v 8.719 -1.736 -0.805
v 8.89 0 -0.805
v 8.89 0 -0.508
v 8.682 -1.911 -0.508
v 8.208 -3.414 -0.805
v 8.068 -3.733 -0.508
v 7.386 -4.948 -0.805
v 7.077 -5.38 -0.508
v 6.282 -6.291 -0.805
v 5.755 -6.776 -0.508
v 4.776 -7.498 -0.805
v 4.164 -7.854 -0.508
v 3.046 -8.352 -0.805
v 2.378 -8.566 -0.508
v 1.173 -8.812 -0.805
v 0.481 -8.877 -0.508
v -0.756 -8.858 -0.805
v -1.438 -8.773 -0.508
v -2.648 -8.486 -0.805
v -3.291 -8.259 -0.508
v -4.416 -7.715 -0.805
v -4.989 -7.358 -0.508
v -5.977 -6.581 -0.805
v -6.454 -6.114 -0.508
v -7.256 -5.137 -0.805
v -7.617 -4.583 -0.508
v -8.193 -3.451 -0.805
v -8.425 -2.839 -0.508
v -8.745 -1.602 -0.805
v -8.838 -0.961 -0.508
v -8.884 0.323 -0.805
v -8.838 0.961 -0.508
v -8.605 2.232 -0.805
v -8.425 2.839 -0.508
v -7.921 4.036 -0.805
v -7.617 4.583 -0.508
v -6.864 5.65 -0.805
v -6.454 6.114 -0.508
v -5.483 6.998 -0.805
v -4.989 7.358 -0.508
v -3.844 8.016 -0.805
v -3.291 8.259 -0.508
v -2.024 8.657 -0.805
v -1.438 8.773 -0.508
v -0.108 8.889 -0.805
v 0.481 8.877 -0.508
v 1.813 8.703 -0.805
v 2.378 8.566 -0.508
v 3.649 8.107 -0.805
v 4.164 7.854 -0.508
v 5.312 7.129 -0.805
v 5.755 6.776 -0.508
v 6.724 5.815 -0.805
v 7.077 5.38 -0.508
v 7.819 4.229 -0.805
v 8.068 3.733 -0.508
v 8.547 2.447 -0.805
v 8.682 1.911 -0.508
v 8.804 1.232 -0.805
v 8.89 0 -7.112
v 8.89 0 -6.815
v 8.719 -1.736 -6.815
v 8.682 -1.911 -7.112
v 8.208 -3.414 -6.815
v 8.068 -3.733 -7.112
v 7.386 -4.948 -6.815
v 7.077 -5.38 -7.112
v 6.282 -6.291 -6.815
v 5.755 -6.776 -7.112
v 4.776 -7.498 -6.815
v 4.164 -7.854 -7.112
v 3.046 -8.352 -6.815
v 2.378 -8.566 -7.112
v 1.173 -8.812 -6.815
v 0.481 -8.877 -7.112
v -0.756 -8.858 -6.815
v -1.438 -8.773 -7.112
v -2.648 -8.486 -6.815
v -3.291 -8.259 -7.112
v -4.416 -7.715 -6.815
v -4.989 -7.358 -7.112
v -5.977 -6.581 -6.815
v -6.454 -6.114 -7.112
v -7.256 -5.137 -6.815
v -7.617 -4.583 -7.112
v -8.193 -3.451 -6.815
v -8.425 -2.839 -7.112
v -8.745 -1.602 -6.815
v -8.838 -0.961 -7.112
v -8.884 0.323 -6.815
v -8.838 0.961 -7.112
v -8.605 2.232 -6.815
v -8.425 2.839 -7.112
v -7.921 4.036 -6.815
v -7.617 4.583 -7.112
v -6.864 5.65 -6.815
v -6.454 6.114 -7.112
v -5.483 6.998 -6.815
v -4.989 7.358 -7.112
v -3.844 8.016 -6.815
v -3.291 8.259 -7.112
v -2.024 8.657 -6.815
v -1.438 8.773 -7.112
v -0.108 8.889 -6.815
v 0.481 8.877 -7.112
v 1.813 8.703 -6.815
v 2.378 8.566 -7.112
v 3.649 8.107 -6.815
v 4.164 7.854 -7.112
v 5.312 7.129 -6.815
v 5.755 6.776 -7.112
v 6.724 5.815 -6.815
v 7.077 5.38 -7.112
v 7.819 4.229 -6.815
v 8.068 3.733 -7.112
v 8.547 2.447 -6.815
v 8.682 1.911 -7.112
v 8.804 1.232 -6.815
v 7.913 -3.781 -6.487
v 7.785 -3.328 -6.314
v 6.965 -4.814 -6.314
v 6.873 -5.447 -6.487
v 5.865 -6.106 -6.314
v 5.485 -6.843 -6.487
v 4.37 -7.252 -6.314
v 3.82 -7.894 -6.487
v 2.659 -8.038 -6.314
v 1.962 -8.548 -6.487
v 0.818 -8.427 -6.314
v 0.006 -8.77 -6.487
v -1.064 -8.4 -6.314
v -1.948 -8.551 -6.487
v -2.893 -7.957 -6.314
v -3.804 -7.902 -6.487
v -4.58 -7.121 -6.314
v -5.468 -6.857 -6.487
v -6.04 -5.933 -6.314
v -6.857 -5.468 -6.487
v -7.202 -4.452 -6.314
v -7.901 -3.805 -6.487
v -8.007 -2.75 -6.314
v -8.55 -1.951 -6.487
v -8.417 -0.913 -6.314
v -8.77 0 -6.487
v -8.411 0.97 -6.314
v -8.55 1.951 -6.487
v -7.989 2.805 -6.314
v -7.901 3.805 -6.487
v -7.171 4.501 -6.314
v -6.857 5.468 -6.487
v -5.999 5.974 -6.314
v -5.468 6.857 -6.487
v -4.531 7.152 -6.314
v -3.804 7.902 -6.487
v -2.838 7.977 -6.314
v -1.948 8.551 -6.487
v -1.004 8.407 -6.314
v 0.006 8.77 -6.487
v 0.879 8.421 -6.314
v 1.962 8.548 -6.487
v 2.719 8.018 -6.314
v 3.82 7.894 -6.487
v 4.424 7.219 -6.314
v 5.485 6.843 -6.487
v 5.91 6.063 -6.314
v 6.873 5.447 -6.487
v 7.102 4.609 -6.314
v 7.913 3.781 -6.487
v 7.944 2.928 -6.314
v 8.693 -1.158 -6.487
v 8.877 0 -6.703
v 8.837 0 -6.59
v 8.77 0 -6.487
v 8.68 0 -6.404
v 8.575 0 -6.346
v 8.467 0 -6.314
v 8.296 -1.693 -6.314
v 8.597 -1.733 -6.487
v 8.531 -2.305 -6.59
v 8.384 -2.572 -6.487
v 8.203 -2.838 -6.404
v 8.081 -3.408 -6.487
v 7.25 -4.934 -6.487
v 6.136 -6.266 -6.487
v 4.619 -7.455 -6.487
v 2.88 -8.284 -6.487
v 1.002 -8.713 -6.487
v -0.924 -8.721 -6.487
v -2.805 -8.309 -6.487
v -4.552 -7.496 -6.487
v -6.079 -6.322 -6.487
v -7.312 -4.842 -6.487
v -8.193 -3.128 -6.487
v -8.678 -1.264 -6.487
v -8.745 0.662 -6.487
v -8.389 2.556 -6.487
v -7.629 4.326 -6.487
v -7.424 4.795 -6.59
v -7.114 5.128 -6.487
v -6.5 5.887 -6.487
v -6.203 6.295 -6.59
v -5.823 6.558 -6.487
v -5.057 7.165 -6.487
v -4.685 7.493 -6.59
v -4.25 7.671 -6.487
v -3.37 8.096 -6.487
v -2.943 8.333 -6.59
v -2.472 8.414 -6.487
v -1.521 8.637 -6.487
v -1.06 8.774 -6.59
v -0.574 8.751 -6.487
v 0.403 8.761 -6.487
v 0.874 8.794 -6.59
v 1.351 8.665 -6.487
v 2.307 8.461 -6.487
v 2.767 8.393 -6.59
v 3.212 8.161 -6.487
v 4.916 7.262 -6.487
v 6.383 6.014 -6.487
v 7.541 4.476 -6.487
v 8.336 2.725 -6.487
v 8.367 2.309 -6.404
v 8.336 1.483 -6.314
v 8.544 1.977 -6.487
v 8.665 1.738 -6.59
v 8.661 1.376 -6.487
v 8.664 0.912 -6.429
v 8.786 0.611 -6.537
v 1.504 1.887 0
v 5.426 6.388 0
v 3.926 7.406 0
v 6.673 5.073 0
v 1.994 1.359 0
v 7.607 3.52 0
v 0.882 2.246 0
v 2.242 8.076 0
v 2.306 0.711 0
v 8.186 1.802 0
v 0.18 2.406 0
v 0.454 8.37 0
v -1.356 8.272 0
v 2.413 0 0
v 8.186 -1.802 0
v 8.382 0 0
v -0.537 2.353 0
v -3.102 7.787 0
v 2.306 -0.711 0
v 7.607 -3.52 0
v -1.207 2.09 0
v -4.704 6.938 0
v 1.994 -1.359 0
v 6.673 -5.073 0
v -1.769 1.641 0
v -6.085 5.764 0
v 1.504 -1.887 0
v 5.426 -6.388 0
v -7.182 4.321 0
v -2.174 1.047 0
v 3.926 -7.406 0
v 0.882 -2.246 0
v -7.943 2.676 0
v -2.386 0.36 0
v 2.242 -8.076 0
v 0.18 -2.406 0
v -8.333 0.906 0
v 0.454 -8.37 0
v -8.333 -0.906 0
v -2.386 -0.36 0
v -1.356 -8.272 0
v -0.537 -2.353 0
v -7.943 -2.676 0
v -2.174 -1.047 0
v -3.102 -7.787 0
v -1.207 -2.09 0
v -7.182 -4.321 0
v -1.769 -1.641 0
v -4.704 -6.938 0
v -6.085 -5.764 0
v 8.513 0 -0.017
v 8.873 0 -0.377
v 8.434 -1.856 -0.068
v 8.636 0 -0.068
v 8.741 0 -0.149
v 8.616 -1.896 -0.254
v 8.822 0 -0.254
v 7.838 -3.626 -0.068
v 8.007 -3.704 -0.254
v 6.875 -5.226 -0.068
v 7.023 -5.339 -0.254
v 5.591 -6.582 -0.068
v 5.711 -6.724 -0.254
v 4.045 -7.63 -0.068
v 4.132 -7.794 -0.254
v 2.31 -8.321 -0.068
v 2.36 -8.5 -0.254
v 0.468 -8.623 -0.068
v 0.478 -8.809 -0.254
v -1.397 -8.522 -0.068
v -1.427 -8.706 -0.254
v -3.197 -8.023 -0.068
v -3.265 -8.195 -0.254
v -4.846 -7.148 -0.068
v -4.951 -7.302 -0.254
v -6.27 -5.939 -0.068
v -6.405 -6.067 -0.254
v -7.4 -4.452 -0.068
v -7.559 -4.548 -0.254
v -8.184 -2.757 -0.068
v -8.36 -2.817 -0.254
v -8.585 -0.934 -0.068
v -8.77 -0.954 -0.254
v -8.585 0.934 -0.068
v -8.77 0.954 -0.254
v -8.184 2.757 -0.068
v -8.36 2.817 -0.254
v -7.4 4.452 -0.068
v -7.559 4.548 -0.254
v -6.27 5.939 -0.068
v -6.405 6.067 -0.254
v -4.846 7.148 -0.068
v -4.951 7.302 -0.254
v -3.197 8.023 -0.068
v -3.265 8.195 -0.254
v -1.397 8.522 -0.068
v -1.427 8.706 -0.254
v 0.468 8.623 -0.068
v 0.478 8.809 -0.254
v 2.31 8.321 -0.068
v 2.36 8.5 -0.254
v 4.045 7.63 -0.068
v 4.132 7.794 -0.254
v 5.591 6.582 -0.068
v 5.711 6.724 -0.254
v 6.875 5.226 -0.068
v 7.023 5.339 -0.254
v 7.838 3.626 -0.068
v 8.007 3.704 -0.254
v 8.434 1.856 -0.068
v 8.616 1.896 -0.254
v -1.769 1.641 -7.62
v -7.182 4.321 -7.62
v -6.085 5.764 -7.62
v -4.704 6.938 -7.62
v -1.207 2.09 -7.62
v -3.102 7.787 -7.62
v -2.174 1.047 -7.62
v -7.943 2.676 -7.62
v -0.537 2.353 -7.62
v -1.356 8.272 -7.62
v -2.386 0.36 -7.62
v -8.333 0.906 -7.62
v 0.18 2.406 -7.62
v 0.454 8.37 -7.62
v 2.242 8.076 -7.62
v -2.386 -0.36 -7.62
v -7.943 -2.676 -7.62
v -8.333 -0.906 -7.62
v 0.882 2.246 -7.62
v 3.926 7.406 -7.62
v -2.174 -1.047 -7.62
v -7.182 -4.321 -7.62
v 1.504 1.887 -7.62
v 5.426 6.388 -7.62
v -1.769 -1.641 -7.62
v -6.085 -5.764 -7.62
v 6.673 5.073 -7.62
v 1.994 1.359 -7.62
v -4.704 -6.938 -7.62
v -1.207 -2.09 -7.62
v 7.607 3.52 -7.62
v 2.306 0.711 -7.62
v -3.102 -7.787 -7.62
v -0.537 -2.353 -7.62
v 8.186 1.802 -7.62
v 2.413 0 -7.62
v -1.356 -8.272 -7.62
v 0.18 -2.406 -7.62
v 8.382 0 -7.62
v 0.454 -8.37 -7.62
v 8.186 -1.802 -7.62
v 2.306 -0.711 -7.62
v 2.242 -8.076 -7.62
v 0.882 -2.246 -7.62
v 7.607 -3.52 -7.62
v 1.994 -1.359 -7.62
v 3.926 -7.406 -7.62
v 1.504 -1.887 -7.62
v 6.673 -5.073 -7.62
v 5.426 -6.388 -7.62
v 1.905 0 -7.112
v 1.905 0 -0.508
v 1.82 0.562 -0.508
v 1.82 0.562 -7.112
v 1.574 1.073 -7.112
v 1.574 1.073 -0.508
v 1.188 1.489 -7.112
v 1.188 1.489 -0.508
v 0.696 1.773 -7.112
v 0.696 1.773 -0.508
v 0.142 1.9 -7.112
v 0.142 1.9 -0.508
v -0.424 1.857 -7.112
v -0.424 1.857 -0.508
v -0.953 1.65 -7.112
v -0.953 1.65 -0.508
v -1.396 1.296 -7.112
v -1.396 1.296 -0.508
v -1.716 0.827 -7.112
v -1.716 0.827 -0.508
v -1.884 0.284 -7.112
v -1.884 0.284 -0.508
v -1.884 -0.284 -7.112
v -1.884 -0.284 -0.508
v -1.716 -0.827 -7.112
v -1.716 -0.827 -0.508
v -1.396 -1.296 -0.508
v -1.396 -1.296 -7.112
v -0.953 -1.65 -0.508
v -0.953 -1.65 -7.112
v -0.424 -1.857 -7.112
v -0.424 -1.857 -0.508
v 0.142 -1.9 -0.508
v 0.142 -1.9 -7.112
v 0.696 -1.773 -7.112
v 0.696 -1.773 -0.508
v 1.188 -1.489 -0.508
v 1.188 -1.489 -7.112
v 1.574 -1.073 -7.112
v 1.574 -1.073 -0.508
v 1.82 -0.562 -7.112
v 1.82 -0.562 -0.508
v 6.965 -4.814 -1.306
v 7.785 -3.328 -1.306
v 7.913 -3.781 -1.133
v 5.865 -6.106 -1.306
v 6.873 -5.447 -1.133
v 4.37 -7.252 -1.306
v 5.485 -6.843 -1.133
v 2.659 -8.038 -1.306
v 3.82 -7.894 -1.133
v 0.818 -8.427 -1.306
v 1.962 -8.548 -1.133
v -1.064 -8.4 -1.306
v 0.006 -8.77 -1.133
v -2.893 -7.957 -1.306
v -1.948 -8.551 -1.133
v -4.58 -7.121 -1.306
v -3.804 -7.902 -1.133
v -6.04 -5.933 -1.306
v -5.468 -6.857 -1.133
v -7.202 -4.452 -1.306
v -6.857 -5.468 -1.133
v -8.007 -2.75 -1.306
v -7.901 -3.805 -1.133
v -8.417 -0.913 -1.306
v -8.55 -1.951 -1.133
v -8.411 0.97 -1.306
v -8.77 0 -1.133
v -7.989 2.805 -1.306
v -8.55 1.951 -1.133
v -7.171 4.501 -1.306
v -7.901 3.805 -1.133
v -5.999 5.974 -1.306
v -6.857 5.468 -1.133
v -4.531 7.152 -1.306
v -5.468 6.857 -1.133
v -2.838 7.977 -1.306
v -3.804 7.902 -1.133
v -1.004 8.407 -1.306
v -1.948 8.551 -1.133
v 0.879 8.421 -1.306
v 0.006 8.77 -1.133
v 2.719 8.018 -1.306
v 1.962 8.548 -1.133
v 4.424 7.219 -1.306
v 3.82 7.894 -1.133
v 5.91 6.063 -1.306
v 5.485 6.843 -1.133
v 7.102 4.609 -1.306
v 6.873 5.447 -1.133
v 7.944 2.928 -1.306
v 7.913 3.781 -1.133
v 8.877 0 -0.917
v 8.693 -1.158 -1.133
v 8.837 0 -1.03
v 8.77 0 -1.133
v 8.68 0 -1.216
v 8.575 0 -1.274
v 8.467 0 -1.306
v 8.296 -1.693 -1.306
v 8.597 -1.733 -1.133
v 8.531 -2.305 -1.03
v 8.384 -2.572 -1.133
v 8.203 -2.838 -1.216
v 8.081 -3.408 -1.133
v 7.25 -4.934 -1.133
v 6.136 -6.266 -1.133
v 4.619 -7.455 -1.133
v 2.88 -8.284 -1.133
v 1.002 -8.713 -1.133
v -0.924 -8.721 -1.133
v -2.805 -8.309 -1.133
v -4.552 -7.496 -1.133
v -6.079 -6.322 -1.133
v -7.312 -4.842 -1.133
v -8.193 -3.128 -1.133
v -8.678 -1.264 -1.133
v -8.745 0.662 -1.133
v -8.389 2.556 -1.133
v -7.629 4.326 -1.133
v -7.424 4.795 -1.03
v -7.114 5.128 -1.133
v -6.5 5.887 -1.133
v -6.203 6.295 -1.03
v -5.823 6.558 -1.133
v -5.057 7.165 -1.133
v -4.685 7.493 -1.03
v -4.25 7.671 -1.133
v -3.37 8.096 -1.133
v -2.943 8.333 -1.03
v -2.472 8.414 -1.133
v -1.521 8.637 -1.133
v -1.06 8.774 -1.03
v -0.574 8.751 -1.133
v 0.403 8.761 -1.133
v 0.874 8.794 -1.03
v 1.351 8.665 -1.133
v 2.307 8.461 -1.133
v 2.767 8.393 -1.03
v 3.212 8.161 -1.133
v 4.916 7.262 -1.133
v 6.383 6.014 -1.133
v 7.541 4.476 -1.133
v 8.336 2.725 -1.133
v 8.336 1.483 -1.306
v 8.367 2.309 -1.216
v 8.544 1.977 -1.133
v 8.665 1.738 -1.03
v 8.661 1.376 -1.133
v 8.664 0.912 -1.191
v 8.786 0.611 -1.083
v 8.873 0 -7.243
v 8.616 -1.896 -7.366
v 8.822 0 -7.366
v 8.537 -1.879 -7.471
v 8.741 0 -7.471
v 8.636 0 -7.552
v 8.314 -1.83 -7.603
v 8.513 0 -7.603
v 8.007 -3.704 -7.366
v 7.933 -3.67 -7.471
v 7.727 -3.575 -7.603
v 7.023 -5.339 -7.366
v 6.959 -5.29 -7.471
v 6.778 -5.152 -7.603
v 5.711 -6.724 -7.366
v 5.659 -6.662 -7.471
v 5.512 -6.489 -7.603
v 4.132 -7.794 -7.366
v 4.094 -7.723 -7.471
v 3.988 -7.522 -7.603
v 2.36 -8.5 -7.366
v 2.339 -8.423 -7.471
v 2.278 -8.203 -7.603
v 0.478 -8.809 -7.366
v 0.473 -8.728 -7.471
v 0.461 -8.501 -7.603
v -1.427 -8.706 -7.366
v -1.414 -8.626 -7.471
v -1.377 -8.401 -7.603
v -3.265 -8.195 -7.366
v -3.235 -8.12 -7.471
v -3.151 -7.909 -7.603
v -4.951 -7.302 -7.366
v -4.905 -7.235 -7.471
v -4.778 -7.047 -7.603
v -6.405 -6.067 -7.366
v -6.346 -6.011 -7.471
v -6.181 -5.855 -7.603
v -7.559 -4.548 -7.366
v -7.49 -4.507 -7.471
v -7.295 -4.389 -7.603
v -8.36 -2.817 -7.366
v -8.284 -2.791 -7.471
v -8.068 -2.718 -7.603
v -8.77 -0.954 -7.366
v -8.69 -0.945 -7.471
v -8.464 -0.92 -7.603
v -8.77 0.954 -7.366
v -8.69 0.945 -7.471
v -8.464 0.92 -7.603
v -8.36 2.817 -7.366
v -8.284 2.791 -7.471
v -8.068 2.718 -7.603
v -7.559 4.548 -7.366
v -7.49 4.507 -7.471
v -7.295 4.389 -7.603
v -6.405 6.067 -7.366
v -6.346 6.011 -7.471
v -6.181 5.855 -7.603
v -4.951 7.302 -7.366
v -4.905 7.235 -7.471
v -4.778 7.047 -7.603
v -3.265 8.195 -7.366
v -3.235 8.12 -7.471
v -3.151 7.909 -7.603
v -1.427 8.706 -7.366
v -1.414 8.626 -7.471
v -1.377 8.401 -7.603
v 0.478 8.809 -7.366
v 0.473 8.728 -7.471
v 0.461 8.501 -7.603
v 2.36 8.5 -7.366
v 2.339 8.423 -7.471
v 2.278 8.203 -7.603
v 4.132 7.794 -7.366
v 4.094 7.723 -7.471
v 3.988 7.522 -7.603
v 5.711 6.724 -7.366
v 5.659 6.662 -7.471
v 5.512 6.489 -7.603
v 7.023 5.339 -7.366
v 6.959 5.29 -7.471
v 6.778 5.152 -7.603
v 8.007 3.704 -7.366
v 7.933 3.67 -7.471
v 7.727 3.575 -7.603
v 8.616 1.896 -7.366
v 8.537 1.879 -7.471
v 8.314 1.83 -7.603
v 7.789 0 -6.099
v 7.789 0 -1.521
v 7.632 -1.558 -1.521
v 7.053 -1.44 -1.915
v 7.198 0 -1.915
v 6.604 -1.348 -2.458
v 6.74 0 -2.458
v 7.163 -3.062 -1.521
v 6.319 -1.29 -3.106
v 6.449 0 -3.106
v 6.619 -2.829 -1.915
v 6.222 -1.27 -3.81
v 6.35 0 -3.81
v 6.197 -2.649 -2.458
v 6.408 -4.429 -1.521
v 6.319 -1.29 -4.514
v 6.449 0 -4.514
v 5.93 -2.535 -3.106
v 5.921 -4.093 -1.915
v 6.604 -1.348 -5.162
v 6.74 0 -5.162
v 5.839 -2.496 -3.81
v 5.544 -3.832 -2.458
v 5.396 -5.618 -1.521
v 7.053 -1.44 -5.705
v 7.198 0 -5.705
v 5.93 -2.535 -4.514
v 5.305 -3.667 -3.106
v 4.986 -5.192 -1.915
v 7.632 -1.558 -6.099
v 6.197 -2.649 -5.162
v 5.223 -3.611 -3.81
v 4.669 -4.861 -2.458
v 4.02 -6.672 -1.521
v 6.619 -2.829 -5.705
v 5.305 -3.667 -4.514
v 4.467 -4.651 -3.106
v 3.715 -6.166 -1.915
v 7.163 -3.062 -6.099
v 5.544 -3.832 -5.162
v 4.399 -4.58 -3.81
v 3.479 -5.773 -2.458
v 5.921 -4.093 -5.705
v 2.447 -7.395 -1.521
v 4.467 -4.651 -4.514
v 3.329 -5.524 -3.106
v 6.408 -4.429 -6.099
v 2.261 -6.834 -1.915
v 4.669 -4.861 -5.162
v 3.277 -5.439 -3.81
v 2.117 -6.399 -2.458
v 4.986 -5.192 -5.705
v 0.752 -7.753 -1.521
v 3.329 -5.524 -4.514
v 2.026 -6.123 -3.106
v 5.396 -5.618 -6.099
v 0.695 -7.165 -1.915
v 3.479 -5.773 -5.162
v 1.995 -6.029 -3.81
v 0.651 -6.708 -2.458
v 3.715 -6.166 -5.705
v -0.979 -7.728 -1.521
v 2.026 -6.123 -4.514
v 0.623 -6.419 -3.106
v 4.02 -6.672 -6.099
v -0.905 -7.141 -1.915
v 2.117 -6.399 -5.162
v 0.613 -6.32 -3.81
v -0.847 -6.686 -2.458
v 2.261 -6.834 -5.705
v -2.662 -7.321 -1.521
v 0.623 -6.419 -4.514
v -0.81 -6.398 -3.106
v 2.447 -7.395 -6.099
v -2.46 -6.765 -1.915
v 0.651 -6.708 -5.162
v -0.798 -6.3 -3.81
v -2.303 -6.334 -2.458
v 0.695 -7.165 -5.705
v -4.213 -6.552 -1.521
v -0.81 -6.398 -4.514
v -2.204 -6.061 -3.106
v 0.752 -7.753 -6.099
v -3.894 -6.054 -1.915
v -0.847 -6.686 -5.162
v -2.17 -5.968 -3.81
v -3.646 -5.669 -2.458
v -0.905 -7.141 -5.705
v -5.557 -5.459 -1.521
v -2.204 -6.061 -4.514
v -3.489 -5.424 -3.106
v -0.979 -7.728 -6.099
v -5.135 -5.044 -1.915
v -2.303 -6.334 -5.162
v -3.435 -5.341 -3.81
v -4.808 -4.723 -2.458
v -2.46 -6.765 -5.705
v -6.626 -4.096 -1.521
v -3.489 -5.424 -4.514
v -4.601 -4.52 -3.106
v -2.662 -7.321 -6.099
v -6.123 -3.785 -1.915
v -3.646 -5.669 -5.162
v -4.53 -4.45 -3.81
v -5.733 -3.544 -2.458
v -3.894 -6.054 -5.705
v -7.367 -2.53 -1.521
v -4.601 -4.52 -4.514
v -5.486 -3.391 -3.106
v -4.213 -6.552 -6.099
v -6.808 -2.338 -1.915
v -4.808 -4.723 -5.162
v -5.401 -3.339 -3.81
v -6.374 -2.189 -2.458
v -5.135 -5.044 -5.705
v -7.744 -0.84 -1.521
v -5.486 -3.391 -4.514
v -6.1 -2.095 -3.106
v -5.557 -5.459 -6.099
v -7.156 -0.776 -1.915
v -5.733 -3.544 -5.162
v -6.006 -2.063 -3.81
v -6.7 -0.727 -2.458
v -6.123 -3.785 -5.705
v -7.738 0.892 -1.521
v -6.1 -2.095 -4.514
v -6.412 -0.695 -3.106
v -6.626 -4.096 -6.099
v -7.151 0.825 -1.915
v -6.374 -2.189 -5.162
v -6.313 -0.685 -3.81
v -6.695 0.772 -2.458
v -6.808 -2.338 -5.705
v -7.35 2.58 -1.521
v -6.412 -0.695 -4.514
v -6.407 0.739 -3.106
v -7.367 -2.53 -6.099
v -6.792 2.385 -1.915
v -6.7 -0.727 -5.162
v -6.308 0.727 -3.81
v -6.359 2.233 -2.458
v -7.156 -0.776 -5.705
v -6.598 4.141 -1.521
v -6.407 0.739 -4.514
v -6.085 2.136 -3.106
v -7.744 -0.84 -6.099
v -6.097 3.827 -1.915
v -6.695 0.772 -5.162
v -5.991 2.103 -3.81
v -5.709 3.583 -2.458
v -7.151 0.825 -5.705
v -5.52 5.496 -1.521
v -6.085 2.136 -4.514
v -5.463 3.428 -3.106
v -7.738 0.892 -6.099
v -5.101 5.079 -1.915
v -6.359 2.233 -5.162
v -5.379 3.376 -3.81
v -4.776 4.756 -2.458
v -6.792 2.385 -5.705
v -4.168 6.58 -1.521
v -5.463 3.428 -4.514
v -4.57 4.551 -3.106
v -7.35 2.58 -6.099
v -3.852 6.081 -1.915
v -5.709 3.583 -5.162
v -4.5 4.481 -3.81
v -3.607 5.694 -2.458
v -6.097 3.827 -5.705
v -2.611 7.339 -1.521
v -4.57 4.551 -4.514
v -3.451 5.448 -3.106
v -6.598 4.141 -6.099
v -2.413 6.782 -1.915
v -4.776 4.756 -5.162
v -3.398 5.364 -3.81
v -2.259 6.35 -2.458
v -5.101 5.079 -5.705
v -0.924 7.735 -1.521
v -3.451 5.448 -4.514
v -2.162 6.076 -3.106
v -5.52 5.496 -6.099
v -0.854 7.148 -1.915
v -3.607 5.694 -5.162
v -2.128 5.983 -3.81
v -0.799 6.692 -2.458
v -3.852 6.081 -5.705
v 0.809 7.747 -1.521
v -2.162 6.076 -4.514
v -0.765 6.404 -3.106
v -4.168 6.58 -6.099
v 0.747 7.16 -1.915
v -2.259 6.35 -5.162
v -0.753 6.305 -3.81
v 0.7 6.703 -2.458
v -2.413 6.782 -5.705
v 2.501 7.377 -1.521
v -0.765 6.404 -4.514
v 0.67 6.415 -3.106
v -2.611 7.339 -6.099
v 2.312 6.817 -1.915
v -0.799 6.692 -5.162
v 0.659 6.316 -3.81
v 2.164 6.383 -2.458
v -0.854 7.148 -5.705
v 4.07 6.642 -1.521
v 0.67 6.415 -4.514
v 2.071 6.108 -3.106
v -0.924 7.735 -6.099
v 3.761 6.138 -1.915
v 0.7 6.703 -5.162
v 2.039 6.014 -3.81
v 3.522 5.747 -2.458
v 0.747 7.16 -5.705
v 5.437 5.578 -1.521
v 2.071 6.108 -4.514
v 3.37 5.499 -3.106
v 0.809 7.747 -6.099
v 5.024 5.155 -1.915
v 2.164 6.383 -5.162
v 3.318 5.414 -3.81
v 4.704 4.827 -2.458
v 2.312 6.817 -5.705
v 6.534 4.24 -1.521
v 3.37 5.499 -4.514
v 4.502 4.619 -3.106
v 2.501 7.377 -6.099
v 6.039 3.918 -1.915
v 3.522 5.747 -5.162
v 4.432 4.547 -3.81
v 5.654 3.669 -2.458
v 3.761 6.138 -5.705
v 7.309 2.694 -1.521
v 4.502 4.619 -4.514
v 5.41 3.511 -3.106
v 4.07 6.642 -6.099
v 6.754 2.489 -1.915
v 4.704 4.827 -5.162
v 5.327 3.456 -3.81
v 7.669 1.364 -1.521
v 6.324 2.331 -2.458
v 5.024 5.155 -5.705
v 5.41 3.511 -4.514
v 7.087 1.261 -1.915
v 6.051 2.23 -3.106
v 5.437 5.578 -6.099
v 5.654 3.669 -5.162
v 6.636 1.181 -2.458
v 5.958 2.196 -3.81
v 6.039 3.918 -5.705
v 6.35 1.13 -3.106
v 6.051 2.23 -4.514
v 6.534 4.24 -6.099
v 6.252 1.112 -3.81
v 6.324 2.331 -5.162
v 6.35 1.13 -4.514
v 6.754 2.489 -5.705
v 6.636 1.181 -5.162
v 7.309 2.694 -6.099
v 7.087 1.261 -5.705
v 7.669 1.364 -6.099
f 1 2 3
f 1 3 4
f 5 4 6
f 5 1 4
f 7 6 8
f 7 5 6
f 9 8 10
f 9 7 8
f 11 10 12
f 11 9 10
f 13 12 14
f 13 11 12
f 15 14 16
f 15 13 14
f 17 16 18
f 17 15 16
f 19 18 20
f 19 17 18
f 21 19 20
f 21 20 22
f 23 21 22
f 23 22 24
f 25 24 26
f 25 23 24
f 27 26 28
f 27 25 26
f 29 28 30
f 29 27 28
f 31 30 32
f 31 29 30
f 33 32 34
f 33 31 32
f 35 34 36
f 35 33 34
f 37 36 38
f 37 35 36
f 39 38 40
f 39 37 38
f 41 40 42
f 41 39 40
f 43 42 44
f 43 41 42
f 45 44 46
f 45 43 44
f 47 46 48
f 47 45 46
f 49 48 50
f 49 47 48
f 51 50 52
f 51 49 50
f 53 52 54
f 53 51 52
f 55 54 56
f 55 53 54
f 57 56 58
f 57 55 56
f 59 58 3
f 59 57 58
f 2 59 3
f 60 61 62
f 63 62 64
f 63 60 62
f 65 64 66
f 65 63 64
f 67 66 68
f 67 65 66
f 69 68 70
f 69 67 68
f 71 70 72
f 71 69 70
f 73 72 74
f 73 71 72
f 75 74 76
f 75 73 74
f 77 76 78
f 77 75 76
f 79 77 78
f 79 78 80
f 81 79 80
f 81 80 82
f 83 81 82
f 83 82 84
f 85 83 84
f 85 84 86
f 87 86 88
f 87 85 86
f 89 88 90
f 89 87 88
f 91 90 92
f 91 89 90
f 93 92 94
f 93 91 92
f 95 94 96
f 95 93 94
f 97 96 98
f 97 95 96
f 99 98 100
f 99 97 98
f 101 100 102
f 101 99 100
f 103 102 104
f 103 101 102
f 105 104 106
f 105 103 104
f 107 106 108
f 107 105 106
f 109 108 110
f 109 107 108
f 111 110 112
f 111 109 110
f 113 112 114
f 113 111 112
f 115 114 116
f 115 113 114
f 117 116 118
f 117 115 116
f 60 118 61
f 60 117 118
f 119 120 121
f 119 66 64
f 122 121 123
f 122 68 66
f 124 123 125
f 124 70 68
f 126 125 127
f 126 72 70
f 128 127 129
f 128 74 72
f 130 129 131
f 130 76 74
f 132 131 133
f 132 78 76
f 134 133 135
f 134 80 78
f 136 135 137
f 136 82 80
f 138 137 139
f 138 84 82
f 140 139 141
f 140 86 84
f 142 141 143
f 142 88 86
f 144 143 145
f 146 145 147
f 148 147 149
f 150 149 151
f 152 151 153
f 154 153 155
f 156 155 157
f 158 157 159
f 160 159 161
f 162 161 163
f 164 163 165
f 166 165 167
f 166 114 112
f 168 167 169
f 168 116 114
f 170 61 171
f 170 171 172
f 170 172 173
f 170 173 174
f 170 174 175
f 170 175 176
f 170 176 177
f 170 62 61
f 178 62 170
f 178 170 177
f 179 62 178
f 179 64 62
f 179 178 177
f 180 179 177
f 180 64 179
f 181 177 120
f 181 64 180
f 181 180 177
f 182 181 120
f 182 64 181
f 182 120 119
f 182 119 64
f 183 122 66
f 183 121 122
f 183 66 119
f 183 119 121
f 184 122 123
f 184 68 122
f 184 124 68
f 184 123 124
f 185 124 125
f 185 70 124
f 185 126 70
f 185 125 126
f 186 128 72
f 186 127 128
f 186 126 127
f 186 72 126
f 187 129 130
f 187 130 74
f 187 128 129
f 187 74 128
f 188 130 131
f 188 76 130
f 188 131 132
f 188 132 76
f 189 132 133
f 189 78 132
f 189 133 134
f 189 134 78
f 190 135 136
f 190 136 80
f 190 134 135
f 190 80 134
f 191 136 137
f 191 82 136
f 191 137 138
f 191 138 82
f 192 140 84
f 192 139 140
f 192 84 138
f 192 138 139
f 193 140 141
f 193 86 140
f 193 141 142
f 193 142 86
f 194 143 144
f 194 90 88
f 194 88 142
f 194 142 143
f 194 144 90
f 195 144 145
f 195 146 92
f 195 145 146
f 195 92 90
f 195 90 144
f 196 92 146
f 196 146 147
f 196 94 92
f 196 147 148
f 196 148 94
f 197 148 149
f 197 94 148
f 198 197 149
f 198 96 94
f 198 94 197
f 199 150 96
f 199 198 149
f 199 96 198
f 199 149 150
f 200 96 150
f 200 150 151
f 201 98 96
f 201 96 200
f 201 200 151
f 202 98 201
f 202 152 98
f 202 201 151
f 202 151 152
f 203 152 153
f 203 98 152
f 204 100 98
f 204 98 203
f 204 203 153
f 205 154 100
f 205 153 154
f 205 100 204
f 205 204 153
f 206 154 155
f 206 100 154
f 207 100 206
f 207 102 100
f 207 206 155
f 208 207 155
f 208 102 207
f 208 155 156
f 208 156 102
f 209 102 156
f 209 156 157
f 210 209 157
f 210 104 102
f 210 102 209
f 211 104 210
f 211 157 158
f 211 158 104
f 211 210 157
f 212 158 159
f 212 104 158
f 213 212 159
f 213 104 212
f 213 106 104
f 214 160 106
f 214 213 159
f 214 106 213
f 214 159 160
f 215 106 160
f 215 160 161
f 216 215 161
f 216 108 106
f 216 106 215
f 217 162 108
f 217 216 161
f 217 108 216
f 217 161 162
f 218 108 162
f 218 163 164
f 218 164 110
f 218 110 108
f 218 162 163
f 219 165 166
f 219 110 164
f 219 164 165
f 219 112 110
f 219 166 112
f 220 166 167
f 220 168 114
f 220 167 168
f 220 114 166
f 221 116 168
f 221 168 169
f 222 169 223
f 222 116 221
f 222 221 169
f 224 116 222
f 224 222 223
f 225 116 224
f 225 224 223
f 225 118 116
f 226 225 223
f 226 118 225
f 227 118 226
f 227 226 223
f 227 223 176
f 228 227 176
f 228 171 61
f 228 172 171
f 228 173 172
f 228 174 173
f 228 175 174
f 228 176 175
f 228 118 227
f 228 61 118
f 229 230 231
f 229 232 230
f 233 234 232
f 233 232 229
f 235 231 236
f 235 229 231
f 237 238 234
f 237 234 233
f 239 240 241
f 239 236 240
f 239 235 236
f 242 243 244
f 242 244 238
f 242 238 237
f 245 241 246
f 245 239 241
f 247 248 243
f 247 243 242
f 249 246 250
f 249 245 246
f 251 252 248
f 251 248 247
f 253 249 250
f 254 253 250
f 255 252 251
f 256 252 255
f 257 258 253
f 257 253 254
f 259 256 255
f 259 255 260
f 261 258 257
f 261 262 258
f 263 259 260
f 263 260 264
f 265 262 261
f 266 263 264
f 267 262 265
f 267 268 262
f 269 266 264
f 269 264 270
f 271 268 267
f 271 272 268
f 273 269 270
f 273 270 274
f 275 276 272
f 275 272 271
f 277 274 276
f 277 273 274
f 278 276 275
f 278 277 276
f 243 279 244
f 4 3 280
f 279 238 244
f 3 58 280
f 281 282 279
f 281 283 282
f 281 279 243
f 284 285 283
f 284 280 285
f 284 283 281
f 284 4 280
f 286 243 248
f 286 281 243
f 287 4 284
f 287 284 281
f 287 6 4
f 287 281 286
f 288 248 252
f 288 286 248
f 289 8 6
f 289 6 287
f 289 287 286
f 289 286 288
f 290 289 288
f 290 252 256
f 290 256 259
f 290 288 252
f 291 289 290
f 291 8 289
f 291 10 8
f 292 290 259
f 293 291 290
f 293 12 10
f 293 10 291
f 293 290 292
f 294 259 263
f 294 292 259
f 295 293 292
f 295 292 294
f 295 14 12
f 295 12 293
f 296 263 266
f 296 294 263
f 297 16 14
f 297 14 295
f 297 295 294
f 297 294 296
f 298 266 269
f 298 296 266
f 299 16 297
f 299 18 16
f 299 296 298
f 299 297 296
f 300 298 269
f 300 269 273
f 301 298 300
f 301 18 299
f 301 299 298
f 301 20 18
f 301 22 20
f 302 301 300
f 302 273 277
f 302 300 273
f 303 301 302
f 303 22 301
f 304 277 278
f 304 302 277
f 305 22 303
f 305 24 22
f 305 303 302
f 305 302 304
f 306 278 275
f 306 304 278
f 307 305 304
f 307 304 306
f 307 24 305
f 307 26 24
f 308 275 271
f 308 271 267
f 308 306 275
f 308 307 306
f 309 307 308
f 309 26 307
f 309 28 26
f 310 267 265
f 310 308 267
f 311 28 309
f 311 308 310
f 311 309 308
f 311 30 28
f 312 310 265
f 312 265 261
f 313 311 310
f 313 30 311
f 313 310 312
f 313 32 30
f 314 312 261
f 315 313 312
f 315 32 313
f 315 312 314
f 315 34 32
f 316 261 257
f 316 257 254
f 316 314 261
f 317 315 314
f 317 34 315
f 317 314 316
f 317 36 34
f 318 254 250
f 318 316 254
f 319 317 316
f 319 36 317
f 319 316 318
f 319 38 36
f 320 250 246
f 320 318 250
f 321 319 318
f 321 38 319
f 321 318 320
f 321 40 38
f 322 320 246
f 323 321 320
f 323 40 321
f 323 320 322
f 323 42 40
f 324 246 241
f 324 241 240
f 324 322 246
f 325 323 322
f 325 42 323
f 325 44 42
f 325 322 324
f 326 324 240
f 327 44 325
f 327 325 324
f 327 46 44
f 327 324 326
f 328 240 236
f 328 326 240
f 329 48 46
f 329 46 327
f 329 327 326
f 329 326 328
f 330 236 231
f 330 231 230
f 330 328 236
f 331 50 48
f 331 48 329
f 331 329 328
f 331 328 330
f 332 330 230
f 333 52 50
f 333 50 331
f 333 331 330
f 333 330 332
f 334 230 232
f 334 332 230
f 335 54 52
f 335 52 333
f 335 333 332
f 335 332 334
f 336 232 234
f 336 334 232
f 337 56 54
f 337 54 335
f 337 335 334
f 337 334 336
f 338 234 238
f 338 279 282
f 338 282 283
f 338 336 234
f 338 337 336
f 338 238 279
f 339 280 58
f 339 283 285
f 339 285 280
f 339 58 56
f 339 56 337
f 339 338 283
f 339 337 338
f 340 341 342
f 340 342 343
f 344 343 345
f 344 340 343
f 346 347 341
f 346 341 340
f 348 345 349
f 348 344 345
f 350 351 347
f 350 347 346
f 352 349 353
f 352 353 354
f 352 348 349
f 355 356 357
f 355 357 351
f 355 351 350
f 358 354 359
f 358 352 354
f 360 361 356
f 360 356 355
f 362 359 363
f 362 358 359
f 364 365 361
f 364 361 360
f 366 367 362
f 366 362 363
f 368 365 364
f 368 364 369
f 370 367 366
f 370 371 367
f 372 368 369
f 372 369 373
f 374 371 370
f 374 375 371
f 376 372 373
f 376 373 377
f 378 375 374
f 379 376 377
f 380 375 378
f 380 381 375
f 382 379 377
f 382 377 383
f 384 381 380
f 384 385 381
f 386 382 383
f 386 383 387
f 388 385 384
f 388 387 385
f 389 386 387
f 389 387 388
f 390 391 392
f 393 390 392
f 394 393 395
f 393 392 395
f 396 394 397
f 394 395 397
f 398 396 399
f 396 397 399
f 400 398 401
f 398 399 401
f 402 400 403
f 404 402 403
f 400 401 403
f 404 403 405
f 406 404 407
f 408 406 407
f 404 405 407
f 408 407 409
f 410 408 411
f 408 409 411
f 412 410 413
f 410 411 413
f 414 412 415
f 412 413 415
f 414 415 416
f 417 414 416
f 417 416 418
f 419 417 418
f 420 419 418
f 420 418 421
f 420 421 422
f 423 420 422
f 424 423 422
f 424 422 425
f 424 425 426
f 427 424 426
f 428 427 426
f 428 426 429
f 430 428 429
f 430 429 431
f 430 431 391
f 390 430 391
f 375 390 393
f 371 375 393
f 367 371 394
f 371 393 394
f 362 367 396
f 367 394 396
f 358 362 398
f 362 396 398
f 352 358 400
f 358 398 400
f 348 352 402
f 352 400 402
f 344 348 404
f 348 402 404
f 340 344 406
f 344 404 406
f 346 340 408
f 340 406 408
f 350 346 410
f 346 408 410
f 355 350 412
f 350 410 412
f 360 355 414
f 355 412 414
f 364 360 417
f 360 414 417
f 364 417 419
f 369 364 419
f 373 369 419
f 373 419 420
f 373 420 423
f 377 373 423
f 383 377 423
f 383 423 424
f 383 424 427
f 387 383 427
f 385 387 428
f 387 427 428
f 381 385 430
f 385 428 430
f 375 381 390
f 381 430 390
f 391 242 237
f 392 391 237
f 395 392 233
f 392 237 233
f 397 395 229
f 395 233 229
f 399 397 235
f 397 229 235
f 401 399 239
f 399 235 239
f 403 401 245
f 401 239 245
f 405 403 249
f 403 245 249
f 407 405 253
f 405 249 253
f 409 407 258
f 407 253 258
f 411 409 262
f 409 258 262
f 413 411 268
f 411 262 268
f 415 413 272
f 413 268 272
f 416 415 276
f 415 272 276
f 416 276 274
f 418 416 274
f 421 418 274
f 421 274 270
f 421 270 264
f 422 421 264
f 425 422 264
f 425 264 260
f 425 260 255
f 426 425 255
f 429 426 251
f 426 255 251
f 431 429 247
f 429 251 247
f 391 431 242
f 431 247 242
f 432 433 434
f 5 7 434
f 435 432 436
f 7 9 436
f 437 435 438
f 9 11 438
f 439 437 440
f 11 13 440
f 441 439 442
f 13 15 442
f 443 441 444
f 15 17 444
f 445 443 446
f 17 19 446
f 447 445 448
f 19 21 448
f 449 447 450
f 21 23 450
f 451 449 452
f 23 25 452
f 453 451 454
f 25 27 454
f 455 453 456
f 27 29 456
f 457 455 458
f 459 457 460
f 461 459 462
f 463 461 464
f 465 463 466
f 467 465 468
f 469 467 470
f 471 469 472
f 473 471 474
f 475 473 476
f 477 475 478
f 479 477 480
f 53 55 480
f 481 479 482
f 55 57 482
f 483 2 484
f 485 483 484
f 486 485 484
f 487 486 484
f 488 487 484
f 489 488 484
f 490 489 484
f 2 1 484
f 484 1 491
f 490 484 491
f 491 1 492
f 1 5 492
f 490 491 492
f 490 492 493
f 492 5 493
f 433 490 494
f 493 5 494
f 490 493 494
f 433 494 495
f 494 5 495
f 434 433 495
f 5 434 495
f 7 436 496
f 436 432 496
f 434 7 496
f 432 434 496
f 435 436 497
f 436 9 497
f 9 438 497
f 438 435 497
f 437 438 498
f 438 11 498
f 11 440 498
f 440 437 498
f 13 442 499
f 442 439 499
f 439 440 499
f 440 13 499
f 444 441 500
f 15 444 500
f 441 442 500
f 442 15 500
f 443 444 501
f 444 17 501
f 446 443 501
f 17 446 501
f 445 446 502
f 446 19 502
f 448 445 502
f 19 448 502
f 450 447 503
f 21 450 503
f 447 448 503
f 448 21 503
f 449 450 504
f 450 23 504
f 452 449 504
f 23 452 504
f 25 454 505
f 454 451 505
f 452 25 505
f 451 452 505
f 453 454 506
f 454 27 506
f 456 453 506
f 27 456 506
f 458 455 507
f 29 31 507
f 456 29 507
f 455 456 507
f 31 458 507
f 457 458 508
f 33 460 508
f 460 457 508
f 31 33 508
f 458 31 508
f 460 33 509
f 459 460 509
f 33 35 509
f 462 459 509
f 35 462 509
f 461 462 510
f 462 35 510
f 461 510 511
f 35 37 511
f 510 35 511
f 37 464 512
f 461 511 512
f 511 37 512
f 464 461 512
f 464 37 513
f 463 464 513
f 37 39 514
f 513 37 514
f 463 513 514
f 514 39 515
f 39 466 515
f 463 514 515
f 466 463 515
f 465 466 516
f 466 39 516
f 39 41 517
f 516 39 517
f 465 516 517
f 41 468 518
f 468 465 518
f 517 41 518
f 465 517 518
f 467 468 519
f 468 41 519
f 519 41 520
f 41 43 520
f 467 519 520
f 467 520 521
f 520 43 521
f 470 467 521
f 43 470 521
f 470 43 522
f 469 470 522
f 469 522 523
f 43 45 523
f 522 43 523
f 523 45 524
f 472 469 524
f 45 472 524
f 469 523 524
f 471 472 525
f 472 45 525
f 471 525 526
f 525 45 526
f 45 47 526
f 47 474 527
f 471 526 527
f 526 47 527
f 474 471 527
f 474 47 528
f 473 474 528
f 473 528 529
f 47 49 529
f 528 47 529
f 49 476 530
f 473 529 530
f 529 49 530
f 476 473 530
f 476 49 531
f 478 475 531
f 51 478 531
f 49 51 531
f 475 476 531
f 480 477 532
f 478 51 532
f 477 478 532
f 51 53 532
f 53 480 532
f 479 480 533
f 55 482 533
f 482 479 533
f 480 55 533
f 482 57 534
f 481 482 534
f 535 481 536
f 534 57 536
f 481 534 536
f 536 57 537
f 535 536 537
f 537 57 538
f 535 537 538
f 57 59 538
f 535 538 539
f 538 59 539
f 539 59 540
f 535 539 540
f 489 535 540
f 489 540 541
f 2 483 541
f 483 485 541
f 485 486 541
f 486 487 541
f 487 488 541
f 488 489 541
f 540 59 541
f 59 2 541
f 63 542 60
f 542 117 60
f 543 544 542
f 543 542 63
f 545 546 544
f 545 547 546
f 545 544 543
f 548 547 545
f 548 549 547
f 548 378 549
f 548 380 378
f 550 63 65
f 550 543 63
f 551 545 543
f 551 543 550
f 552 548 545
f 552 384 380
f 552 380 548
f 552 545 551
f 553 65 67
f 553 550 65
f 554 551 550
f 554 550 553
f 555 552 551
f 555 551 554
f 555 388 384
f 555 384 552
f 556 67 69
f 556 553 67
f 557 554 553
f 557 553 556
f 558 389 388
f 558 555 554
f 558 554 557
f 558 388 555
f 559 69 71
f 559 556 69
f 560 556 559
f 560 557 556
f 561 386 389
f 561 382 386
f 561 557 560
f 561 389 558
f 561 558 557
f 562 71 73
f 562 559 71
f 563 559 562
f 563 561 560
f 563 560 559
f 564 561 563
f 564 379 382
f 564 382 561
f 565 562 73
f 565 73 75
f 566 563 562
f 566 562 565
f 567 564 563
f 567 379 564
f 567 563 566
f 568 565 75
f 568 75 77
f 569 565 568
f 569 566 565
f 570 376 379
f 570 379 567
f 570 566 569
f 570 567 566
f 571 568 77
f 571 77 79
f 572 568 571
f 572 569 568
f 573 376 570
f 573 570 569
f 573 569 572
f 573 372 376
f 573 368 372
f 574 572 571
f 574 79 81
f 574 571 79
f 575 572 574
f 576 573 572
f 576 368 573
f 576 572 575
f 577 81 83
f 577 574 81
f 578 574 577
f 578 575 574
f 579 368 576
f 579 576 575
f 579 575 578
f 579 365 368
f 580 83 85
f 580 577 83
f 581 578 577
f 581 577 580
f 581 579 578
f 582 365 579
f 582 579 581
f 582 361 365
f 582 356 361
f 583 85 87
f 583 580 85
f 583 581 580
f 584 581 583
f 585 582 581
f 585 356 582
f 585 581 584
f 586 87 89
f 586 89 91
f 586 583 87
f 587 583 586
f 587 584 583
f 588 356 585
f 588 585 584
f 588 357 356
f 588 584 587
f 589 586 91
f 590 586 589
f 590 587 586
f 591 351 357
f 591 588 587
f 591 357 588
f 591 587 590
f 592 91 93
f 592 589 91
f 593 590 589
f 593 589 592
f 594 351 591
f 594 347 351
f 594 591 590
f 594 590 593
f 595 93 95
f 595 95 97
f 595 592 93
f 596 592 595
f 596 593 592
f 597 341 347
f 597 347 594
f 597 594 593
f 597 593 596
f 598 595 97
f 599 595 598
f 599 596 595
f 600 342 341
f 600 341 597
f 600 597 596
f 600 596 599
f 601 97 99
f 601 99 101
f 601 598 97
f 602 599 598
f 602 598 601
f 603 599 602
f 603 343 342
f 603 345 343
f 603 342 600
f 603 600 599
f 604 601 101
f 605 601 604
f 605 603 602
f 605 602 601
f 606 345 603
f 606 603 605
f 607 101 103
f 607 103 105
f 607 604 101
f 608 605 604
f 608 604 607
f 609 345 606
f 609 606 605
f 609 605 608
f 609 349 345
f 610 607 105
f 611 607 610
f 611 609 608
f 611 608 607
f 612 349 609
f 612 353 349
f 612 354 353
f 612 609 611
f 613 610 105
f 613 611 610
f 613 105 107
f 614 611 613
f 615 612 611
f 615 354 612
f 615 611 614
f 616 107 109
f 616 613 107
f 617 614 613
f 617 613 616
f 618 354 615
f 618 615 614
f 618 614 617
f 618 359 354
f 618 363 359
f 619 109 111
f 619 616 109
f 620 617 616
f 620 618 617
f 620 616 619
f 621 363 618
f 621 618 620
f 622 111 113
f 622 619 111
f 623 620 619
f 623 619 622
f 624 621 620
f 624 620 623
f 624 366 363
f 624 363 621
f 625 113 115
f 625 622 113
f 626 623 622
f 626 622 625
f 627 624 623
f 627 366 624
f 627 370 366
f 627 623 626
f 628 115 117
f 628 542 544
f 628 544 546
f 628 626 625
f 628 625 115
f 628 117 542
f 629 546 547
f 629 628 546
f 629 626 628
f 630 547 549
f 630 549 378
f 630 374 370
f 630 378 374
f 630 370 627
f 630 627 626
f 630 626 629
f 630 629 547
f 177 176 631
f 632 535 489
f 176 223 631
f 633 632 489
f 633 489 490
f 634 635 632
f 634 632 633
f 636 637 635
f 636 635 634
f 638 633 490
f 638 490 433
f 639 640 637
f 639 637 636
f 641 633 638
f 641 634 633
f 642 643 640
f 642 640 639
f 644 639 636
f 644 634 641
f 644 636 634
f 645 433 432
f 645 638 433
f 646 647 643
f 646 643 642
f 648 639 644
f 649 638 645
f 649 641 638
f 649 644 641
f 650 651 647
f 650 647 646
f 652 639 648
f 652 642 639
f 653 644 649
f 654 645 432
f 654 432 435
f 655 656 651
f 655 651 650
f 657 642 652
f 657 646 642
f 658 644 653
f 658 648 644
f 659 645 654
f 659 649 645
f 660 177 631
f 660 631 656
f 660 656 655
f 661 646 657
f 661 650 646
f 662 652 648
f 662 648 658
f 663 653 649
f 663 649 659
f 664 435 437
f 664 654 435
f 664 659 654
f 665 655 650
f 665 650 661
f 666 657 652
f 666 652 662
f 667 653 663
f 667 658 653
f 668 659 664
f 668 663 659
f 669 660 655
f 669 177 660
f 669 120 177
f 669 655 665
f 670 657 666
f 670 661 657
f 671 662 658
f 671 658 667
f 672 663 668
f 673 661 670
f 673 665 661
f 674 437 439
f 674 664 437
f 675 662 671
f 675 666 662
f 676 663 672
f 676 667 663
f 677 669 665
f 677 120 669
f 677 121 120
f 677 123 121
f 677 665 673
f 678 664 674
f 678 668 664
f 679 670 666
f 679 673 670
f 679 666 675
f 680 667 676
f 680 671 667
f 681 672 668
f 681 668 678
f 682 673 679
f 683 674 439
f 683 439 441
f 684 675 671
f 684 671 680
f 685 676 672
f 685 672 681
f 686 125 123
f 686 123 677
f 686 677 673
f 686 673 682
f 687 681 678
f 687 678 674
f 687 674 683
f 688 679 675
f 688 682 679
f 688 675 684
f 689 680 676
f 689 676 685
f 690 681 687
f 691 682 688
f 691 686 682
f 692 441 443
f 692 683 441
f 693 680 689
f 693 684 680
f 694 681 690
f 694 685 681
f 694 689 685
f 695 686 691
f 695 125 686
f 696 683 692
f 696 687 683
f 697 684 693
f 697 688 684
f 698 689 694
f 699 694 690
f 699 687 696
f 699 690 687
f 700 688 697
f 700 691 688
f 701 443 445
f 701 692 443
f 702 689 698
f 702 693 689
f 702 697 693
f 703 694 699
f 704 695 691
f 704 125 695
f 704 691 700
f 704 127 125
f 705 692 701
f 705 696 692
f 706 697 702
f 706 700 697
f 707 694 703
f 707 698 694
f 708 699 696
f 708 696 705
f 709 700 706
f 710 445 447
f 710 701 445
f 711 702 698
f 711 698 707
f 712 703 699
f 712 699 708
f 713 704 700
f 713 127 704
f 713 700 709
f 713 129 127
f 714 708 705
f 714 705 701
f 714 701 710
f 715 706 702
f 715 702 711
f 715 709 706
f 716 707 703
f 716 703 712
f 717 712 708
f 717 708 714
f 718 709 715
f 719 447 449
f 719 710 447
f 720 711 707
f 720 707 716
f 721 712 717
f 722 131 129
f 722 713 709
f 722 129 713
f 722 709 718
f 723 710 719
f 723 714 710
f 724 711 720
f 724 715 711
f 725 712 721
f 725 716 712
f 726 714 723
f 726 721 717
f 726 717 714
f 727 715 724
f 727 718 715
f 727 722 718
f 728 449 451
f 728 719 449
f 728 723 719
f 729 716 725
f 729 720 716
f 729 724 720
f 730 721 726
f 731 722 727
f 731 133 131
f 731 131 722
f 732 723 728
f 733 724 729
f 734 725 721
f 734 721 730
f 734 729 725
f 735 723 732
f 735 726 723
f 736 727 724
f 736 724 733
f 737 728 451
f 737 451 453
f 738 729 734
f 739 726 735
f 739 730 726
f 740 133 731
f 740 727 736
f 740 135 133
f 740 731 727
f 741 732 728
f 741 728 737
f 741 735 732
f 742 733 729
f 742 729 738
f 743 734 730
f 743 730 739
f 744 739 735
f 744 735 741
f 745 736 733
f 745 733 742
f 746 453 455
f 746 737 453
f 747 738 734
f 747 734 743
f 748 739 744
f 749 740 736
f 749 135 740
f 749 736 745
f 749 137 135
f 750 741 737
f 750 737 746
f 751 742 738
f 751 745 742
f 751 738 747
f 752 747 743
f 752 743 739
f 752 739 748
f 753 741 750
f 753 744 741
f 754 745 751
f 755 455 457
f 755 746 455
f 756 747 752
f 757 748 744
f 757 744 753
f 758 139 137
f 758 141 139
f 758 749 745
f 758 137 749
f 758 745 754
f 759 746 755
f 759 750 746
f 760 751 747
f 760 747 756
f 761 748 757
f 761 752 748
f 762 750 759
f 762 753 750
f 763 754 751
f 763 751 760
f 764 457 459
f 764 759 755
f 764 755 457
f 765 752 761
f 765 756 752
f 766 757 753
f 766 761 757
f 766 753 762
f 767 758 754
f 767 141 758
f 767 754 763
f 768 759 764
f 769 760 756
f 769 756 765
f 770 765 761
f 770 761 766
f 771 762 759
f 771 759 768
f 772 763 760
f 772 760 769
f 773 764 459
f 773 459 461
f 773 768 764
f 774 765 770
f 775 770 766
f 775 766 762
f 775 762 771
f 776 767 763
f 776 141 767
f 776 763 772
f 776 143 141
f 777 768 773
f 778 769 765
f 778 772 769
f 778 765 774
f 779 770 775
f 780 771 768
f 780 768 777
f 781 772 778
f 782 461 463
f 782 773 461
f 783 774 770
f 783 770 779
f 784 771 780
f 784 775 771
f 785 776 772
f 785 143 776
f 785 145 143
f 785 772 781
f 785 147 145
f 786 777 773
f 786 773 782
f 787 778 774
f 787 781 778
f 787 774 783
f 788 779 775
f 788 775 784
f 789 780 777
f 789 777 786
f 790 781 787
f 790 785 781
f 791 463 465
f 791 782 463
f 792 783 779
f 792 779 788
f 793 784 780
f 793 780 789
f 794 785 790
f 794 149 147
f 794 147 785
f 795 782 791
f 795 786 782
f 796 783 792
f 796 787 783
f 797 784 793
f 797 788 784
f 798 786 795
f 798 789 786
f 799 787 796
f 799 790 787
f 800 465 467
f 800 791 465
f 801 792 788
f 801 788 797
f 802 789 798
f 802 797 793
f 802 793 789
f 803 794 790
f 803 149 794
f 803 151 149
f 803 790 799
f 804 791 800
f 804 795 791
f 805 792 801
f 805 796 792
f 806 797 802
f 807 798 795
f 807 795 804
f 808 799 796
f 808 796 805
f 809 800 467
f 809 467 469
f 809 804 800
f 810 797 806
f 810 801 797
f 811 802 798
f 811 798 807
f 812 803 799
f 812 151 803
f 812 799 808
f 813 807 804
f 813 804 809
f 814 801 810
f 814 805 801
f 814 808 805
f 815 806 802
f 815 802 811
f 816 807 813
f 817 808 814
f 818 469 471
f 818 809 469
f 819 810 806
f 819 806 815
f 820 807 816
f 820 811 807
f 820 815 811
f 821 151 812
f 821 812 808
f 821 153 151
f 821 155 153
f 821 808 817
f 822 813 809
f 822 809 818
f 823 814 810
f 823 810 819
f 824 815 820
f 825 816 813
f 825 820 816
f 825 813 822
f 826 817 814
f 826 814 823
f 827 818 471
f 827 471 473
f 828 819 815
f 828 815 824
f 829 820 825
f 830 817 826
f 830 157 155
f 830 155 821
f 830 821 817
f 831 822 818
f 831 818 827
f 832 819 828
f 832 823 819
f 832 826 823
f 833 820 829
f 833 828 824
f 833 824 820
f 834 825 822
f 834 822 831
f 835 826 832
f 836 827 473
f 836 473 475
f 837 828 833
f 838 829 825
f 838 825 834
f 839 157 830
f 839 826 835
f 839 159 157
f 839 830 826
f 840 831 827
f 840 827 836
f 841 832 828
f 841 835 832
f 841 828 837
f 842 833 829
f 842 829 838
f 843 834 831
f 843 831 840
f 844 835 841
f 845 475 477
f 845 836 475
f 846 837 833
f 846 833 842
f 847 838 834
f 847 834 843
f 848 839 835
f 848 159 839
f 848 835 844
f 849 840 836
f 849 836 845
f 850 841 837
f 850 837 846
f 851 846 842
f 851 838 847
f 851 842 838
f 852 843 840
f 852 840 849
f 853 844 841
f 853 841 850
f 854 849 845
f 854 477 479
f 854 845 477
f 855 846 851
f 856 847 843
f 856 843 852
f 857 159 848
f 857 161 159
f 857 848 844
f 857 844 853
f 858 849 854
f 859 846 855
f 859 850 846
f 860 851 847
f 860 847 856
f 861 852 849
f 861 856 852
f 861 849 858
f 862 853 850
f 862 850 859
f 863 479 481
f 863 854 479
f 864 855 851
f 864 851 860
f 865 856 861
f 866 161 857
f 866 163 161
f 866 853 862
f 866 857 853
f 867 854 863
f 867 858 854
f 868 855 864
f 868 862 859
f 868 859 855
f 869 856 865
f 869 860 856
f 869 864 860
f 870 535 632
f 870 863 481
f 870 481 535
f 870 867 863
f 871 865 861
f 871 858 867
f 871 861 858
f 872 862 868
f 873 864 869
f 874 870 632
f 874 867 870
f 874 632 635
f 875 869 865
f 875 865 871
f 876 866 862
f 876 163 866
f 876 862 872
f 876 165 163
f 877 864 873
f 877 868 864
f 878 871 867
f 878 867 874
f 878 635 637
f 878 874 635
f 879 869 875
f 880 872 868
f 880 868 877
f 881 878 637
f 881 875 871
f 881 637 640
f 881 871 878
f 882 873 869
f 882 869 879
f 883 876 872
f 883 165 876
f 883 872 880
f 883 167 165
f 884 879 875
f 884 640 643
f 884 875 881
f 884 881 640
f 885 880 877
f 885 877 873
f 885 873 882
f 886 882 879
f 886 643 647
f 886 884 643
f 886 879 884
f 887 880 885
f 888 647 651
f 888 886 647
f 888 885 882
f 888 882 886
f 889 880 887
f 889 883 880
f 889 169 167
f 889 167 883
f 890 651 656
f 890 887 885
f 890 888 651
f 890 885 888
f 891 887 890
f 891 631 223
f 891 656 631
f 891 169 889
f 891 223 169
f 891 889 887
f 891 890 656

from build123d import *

# Parameters (mm, degrees)
FILLET1_R          = 0.508
SKETCH2_R          = 1.905
CUT_EXTRUDE1_DEPTH = 15.701312987
CHAMFER1_SIZE      = 0.508


with BuildPart() as part:
    # Sketch1 → Revolve1 (revolve)
    with BuildSketch(Plane(origin=(0, 0, 0), x_dir=(1, 0, 0), z_dir=(0, 1, 0))):
        with BuildLine():
            Line((8.89, 6.35), (8.89, 7.62))
            Line((8.89, 7.62), (0, 7.62))
            Line((0, 7.62), (0, 0))
            Line((0, 0), (8.89, 0))
            Line((8.89, 0), (8.89, 1.27))
            ThreePointArc((8.89, 1.27), (6.35, 3.81), (8.89, 6.35))
        make_face()
    revolve(axis=Axis((0, 0, 0), (0, 0, -1)))

    # Fillet1
    fillet1_edges = [part.edges().sort_by_distance(p)[0] for p in [
        (-8.89, 0, 0),
        (-8.89, 0, -1.27),
        (-8.89, 0, -6.35),
        (-8.89, 0, -7.62),
    ]]
    fillet(fillet1_edges, radius=FILLET1_R)

    # Sketch2 → Cut-Extrude1 (cut, through all)
    with BuildSketch(Plane.XY):
        Circle(SKETCH2_R)
    extrude(amount=-CUT_EXTRUDE1_DEPTH, mode=Mode.SUBTRACT)

    # Chamfer1
    chamfer1_edges = [part.edges().sort_by_distance(p)[0] for p in [
        (-1.905, 0, -7.62),
        (-1.905, 0, 0),
    ]]
    chamfer(chamfer1_edges, length=CHAMFER1_SIZE)


solid = part.part
